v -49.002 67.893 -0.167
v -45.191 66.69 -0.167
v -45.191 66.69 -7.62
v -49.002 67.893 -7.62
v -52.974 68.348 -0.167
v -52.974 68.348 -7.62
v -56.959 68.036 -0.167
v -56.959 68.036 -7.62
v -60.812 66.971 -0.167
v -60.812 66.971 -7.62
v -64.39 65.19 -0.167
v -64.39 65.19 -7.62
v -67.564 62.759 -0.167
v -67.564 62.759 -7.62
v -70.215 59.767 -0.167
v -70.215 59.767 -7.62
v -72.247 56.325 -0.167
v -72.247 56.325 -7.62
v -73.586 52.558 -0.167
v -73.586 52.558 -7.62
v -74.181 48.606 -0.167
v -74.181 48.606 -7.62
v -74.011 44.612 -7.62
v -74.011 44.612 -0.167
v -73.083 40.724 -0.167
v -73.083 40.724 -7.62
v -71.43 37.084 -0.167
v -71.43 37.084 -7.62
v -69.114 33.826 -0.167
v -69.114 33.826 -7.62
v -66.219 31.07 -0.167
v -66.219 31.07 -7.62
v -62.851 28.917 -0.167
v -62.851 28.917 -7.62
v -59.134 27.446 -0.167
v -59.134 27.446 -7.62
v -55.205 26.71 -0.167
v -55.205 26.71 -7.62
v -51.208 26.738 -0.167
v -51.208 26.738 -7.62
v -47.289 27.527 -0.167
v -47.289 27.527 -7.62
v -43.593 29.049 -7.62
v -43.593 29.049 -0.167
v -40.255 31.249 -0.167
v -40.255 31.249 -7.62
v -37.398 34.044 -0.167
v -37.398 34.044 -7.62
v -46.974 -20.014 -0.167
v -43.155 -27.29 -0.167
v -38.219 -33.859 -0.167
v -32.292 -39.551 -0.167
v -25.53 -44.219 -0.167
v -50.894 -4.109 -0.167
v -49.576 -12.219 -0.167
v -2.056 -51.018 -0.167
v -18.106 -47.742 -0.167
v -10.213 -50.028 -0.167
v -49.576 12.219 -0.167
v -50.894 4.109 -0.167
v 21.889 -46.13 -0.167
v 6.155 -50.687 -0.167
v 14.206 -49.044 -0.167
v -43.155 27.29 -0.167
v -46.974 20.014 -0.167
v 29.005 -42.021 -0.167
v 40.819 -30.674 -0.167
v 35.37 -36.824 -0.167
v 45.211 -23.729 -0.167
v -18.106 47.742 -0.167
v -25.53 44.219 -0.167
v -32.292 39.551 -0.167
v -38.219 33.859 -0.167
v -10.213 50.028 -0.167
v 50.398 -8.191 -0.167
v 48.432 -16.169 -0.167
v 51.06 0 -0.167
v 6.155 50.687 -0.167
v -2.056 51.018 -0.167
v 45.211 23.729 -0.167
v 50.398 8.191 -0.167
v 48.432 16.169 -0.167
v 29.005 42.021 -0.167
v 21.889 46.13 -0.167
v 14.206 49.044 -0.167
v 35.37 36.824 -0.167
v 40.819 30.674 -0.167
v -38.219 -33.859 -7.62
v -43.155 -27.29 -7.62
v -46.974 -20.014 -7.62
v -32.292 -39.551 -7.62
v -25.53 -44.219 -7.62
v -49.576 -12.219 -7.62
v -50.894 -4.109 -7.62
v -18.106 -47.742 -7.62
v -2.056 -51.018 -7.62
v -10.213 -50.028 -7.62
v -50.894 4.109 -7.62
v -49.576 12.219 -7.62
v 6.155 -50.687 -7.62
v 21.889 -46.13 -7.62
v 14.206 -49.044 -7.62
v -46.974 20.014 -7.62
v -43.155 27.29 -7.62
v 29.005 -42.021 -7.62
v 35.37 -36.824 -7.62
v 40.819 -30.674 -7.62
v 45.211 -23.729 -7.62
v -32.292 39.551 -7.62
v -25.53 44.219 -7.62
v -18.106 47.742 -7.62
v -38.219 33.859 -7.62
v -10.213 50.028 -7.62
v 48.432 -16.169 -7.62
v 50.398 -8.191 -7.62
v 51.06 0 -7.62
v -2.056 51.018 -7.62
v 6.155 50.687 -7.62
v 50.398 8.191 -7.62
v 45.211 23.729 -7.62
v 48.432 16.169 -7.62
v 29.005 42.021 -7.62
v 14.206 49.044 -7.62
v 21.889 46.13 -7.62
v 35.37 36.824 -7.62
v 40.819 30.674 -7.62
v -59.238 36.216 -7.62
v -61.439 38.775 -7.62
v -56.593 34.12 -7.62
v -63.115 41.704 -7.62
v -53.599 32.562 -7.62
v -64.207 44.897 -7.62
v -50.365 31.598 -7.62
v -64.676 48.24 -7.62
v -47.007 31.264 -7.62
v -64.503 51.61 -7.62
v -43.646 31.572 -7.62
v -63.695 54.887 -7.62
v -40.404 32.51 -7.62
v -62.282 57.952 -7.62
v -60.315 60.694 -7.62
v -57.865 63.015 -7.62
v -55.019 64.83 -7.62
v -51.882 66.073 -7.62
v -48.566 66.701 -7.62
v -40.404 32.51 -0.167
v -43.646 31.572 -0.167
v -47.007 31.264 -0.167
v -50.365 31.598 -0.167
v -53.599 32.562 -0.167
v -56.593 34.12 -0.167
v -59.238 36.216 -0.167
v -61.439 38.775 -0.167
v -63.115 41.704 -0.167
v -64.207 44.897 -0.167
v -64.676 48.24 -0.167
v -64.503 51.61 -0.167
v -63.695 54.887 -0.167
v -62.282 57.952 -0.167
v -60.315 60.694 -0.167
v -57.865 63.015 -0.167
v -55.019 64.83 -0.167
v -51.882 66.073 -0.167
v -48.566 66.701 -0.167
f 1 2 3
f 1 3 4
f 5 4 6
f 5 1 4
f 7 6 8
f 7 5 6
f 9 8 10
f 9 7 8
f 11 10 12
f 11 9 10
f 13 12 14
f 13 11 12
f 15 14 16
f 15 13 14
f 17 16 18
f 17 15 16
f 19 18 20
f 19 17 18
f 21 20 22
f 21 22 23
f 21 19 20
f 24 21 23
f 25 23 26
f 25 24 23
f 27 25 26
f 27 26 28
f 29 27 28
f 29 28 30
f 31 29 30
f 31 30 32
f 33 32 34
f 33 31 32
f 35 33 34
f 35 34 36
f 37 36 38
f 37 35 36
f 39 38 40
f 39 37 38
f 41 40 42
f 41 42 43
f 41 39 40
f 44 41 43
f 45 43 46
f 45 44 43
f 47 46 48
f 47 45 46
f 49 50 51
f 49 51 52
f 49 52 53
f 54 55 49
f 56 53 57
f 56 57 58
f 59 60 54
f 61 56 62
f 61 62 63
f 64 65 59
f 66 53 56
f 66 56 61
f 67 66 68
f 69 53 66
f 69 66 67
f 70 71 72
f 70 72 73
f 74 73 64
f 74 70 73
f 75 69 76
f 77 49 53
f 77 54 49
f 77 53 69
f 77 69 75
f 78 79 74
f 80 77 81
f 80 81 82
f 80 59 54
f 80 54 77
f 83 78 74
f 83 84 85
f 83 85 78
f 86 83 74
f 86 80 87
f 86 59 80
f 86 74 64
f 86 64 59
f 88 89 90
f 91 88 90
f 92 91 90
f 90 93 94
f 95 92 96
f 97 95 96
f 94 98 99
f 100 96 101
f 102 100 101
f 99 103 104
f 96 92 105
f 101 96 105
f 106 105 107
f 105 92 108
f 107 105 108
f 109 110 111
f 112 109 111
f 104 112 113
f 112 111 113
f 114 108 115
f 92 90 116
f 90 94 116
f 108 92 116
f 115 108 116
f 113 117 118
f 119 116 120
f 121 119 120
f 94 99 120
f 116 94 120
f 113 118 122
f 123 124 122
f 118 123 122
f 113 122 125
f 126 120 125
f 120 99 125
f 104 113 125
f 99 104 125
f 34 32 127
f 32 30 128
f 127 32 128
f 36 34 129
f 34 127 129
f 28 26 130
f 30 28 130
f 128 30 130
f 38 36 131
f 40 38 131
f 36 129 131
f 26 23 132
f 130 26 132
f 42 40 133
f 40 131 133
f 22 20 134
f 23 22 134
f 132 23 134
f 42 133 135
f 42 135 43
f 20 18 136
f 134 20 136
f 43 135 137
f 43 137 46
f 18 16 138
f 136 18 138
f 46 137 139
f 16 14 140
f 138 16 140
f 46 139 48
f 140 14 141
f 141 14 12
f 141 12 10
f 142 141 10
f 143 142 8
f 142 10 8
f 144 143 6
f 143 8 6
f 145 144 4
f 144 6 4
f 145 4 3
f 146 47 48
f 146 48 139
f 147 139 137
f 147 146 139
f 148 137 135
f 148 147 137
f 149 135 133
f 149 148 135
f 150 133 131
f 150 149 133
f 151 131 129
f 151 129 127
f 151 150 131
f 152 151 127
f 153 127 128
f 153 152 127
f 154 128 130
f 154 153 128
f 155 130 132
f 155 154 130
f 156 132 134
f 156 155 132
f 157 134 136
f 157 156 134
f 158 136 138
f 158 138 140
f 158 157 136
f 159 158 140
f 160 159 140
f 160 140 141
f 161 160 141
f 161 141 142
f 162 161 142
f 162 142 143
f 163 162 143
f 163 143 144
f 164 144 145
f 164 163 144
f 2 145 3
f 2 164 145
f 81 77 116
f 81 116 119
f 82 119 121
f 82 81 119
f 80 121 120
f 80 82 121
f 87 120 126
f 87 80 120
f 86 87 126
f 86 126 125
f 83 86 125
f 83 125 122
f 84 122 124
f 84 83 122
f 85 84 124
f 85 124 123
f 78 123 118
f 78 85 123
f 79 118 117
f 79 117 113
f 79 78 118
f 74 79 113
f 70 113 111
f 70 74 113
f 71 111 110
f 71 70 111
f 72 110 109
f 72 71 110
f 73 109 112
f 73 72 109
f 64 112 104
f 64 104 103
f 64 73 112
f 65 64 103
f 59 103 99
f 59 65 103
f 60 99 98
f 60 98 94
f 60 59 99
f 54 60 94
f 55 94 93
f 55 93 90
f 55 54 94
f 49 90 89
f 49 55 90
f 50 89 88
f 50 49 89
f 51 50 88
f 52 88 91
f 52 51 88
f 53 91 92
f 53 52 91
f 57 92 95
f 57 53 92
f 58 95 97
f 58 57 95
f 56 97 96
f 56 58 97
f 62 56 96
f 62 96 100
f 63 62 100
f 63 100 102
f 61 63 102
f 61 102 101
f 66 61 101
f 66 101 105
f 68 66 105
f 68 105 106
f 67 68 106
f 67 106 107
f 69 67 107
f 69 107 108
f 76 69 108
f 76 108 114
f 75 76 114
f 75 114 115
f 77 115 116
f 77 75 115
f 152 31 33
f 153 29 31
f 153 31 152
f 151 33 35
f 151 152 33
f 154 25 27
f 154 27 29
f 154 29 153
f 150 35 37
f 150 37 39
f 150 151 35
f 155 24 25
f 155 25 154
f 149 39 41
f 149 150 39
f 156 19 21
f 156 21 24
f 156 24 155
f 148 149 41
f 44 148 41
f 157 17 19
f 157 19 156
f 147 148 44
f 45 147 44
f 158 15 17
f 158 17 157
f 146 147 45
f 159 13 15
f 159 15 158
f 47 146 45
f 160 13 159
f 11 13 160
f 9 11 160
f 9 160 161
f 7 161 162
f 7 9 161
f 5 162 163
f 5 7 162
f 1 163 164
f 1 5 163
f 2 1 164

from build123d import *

# Parameters (mm, degrees)
F2_START = -0.1671565697
F0_R     = 51.0596699872
F2_DEPTH = 7.4528434303


with BuildPart() as f2:
    # F0 (on Top) → F2 (new body)
    with BuildSketch(Plane.XY.offset(F2_START)):
        Circle(F0_R)
    extrude(amount=-F2_DEPTH)


with BuildPart() as f2b:
    # F1 (on Top) → F2, piece 2 (new body)
    with BuildSketch(Plane.XY.offset(F2_START)):
        with BuildLine():
            ThreePointArc((-37.3976192057, 34.0441051263), (-64.2074274415, 44.8972695268), (-45.1905801892, 66.6898488998))
            ThreePointArc((-45.1905801892, 66.6898488998), (-73.6405739448, 42.6454555335), (-37.3976192057, 34.0441051263))
        make_face()
    extrude(amount=-F2_DEPTH)


solid = Compound([f2.part, f2b.part])
